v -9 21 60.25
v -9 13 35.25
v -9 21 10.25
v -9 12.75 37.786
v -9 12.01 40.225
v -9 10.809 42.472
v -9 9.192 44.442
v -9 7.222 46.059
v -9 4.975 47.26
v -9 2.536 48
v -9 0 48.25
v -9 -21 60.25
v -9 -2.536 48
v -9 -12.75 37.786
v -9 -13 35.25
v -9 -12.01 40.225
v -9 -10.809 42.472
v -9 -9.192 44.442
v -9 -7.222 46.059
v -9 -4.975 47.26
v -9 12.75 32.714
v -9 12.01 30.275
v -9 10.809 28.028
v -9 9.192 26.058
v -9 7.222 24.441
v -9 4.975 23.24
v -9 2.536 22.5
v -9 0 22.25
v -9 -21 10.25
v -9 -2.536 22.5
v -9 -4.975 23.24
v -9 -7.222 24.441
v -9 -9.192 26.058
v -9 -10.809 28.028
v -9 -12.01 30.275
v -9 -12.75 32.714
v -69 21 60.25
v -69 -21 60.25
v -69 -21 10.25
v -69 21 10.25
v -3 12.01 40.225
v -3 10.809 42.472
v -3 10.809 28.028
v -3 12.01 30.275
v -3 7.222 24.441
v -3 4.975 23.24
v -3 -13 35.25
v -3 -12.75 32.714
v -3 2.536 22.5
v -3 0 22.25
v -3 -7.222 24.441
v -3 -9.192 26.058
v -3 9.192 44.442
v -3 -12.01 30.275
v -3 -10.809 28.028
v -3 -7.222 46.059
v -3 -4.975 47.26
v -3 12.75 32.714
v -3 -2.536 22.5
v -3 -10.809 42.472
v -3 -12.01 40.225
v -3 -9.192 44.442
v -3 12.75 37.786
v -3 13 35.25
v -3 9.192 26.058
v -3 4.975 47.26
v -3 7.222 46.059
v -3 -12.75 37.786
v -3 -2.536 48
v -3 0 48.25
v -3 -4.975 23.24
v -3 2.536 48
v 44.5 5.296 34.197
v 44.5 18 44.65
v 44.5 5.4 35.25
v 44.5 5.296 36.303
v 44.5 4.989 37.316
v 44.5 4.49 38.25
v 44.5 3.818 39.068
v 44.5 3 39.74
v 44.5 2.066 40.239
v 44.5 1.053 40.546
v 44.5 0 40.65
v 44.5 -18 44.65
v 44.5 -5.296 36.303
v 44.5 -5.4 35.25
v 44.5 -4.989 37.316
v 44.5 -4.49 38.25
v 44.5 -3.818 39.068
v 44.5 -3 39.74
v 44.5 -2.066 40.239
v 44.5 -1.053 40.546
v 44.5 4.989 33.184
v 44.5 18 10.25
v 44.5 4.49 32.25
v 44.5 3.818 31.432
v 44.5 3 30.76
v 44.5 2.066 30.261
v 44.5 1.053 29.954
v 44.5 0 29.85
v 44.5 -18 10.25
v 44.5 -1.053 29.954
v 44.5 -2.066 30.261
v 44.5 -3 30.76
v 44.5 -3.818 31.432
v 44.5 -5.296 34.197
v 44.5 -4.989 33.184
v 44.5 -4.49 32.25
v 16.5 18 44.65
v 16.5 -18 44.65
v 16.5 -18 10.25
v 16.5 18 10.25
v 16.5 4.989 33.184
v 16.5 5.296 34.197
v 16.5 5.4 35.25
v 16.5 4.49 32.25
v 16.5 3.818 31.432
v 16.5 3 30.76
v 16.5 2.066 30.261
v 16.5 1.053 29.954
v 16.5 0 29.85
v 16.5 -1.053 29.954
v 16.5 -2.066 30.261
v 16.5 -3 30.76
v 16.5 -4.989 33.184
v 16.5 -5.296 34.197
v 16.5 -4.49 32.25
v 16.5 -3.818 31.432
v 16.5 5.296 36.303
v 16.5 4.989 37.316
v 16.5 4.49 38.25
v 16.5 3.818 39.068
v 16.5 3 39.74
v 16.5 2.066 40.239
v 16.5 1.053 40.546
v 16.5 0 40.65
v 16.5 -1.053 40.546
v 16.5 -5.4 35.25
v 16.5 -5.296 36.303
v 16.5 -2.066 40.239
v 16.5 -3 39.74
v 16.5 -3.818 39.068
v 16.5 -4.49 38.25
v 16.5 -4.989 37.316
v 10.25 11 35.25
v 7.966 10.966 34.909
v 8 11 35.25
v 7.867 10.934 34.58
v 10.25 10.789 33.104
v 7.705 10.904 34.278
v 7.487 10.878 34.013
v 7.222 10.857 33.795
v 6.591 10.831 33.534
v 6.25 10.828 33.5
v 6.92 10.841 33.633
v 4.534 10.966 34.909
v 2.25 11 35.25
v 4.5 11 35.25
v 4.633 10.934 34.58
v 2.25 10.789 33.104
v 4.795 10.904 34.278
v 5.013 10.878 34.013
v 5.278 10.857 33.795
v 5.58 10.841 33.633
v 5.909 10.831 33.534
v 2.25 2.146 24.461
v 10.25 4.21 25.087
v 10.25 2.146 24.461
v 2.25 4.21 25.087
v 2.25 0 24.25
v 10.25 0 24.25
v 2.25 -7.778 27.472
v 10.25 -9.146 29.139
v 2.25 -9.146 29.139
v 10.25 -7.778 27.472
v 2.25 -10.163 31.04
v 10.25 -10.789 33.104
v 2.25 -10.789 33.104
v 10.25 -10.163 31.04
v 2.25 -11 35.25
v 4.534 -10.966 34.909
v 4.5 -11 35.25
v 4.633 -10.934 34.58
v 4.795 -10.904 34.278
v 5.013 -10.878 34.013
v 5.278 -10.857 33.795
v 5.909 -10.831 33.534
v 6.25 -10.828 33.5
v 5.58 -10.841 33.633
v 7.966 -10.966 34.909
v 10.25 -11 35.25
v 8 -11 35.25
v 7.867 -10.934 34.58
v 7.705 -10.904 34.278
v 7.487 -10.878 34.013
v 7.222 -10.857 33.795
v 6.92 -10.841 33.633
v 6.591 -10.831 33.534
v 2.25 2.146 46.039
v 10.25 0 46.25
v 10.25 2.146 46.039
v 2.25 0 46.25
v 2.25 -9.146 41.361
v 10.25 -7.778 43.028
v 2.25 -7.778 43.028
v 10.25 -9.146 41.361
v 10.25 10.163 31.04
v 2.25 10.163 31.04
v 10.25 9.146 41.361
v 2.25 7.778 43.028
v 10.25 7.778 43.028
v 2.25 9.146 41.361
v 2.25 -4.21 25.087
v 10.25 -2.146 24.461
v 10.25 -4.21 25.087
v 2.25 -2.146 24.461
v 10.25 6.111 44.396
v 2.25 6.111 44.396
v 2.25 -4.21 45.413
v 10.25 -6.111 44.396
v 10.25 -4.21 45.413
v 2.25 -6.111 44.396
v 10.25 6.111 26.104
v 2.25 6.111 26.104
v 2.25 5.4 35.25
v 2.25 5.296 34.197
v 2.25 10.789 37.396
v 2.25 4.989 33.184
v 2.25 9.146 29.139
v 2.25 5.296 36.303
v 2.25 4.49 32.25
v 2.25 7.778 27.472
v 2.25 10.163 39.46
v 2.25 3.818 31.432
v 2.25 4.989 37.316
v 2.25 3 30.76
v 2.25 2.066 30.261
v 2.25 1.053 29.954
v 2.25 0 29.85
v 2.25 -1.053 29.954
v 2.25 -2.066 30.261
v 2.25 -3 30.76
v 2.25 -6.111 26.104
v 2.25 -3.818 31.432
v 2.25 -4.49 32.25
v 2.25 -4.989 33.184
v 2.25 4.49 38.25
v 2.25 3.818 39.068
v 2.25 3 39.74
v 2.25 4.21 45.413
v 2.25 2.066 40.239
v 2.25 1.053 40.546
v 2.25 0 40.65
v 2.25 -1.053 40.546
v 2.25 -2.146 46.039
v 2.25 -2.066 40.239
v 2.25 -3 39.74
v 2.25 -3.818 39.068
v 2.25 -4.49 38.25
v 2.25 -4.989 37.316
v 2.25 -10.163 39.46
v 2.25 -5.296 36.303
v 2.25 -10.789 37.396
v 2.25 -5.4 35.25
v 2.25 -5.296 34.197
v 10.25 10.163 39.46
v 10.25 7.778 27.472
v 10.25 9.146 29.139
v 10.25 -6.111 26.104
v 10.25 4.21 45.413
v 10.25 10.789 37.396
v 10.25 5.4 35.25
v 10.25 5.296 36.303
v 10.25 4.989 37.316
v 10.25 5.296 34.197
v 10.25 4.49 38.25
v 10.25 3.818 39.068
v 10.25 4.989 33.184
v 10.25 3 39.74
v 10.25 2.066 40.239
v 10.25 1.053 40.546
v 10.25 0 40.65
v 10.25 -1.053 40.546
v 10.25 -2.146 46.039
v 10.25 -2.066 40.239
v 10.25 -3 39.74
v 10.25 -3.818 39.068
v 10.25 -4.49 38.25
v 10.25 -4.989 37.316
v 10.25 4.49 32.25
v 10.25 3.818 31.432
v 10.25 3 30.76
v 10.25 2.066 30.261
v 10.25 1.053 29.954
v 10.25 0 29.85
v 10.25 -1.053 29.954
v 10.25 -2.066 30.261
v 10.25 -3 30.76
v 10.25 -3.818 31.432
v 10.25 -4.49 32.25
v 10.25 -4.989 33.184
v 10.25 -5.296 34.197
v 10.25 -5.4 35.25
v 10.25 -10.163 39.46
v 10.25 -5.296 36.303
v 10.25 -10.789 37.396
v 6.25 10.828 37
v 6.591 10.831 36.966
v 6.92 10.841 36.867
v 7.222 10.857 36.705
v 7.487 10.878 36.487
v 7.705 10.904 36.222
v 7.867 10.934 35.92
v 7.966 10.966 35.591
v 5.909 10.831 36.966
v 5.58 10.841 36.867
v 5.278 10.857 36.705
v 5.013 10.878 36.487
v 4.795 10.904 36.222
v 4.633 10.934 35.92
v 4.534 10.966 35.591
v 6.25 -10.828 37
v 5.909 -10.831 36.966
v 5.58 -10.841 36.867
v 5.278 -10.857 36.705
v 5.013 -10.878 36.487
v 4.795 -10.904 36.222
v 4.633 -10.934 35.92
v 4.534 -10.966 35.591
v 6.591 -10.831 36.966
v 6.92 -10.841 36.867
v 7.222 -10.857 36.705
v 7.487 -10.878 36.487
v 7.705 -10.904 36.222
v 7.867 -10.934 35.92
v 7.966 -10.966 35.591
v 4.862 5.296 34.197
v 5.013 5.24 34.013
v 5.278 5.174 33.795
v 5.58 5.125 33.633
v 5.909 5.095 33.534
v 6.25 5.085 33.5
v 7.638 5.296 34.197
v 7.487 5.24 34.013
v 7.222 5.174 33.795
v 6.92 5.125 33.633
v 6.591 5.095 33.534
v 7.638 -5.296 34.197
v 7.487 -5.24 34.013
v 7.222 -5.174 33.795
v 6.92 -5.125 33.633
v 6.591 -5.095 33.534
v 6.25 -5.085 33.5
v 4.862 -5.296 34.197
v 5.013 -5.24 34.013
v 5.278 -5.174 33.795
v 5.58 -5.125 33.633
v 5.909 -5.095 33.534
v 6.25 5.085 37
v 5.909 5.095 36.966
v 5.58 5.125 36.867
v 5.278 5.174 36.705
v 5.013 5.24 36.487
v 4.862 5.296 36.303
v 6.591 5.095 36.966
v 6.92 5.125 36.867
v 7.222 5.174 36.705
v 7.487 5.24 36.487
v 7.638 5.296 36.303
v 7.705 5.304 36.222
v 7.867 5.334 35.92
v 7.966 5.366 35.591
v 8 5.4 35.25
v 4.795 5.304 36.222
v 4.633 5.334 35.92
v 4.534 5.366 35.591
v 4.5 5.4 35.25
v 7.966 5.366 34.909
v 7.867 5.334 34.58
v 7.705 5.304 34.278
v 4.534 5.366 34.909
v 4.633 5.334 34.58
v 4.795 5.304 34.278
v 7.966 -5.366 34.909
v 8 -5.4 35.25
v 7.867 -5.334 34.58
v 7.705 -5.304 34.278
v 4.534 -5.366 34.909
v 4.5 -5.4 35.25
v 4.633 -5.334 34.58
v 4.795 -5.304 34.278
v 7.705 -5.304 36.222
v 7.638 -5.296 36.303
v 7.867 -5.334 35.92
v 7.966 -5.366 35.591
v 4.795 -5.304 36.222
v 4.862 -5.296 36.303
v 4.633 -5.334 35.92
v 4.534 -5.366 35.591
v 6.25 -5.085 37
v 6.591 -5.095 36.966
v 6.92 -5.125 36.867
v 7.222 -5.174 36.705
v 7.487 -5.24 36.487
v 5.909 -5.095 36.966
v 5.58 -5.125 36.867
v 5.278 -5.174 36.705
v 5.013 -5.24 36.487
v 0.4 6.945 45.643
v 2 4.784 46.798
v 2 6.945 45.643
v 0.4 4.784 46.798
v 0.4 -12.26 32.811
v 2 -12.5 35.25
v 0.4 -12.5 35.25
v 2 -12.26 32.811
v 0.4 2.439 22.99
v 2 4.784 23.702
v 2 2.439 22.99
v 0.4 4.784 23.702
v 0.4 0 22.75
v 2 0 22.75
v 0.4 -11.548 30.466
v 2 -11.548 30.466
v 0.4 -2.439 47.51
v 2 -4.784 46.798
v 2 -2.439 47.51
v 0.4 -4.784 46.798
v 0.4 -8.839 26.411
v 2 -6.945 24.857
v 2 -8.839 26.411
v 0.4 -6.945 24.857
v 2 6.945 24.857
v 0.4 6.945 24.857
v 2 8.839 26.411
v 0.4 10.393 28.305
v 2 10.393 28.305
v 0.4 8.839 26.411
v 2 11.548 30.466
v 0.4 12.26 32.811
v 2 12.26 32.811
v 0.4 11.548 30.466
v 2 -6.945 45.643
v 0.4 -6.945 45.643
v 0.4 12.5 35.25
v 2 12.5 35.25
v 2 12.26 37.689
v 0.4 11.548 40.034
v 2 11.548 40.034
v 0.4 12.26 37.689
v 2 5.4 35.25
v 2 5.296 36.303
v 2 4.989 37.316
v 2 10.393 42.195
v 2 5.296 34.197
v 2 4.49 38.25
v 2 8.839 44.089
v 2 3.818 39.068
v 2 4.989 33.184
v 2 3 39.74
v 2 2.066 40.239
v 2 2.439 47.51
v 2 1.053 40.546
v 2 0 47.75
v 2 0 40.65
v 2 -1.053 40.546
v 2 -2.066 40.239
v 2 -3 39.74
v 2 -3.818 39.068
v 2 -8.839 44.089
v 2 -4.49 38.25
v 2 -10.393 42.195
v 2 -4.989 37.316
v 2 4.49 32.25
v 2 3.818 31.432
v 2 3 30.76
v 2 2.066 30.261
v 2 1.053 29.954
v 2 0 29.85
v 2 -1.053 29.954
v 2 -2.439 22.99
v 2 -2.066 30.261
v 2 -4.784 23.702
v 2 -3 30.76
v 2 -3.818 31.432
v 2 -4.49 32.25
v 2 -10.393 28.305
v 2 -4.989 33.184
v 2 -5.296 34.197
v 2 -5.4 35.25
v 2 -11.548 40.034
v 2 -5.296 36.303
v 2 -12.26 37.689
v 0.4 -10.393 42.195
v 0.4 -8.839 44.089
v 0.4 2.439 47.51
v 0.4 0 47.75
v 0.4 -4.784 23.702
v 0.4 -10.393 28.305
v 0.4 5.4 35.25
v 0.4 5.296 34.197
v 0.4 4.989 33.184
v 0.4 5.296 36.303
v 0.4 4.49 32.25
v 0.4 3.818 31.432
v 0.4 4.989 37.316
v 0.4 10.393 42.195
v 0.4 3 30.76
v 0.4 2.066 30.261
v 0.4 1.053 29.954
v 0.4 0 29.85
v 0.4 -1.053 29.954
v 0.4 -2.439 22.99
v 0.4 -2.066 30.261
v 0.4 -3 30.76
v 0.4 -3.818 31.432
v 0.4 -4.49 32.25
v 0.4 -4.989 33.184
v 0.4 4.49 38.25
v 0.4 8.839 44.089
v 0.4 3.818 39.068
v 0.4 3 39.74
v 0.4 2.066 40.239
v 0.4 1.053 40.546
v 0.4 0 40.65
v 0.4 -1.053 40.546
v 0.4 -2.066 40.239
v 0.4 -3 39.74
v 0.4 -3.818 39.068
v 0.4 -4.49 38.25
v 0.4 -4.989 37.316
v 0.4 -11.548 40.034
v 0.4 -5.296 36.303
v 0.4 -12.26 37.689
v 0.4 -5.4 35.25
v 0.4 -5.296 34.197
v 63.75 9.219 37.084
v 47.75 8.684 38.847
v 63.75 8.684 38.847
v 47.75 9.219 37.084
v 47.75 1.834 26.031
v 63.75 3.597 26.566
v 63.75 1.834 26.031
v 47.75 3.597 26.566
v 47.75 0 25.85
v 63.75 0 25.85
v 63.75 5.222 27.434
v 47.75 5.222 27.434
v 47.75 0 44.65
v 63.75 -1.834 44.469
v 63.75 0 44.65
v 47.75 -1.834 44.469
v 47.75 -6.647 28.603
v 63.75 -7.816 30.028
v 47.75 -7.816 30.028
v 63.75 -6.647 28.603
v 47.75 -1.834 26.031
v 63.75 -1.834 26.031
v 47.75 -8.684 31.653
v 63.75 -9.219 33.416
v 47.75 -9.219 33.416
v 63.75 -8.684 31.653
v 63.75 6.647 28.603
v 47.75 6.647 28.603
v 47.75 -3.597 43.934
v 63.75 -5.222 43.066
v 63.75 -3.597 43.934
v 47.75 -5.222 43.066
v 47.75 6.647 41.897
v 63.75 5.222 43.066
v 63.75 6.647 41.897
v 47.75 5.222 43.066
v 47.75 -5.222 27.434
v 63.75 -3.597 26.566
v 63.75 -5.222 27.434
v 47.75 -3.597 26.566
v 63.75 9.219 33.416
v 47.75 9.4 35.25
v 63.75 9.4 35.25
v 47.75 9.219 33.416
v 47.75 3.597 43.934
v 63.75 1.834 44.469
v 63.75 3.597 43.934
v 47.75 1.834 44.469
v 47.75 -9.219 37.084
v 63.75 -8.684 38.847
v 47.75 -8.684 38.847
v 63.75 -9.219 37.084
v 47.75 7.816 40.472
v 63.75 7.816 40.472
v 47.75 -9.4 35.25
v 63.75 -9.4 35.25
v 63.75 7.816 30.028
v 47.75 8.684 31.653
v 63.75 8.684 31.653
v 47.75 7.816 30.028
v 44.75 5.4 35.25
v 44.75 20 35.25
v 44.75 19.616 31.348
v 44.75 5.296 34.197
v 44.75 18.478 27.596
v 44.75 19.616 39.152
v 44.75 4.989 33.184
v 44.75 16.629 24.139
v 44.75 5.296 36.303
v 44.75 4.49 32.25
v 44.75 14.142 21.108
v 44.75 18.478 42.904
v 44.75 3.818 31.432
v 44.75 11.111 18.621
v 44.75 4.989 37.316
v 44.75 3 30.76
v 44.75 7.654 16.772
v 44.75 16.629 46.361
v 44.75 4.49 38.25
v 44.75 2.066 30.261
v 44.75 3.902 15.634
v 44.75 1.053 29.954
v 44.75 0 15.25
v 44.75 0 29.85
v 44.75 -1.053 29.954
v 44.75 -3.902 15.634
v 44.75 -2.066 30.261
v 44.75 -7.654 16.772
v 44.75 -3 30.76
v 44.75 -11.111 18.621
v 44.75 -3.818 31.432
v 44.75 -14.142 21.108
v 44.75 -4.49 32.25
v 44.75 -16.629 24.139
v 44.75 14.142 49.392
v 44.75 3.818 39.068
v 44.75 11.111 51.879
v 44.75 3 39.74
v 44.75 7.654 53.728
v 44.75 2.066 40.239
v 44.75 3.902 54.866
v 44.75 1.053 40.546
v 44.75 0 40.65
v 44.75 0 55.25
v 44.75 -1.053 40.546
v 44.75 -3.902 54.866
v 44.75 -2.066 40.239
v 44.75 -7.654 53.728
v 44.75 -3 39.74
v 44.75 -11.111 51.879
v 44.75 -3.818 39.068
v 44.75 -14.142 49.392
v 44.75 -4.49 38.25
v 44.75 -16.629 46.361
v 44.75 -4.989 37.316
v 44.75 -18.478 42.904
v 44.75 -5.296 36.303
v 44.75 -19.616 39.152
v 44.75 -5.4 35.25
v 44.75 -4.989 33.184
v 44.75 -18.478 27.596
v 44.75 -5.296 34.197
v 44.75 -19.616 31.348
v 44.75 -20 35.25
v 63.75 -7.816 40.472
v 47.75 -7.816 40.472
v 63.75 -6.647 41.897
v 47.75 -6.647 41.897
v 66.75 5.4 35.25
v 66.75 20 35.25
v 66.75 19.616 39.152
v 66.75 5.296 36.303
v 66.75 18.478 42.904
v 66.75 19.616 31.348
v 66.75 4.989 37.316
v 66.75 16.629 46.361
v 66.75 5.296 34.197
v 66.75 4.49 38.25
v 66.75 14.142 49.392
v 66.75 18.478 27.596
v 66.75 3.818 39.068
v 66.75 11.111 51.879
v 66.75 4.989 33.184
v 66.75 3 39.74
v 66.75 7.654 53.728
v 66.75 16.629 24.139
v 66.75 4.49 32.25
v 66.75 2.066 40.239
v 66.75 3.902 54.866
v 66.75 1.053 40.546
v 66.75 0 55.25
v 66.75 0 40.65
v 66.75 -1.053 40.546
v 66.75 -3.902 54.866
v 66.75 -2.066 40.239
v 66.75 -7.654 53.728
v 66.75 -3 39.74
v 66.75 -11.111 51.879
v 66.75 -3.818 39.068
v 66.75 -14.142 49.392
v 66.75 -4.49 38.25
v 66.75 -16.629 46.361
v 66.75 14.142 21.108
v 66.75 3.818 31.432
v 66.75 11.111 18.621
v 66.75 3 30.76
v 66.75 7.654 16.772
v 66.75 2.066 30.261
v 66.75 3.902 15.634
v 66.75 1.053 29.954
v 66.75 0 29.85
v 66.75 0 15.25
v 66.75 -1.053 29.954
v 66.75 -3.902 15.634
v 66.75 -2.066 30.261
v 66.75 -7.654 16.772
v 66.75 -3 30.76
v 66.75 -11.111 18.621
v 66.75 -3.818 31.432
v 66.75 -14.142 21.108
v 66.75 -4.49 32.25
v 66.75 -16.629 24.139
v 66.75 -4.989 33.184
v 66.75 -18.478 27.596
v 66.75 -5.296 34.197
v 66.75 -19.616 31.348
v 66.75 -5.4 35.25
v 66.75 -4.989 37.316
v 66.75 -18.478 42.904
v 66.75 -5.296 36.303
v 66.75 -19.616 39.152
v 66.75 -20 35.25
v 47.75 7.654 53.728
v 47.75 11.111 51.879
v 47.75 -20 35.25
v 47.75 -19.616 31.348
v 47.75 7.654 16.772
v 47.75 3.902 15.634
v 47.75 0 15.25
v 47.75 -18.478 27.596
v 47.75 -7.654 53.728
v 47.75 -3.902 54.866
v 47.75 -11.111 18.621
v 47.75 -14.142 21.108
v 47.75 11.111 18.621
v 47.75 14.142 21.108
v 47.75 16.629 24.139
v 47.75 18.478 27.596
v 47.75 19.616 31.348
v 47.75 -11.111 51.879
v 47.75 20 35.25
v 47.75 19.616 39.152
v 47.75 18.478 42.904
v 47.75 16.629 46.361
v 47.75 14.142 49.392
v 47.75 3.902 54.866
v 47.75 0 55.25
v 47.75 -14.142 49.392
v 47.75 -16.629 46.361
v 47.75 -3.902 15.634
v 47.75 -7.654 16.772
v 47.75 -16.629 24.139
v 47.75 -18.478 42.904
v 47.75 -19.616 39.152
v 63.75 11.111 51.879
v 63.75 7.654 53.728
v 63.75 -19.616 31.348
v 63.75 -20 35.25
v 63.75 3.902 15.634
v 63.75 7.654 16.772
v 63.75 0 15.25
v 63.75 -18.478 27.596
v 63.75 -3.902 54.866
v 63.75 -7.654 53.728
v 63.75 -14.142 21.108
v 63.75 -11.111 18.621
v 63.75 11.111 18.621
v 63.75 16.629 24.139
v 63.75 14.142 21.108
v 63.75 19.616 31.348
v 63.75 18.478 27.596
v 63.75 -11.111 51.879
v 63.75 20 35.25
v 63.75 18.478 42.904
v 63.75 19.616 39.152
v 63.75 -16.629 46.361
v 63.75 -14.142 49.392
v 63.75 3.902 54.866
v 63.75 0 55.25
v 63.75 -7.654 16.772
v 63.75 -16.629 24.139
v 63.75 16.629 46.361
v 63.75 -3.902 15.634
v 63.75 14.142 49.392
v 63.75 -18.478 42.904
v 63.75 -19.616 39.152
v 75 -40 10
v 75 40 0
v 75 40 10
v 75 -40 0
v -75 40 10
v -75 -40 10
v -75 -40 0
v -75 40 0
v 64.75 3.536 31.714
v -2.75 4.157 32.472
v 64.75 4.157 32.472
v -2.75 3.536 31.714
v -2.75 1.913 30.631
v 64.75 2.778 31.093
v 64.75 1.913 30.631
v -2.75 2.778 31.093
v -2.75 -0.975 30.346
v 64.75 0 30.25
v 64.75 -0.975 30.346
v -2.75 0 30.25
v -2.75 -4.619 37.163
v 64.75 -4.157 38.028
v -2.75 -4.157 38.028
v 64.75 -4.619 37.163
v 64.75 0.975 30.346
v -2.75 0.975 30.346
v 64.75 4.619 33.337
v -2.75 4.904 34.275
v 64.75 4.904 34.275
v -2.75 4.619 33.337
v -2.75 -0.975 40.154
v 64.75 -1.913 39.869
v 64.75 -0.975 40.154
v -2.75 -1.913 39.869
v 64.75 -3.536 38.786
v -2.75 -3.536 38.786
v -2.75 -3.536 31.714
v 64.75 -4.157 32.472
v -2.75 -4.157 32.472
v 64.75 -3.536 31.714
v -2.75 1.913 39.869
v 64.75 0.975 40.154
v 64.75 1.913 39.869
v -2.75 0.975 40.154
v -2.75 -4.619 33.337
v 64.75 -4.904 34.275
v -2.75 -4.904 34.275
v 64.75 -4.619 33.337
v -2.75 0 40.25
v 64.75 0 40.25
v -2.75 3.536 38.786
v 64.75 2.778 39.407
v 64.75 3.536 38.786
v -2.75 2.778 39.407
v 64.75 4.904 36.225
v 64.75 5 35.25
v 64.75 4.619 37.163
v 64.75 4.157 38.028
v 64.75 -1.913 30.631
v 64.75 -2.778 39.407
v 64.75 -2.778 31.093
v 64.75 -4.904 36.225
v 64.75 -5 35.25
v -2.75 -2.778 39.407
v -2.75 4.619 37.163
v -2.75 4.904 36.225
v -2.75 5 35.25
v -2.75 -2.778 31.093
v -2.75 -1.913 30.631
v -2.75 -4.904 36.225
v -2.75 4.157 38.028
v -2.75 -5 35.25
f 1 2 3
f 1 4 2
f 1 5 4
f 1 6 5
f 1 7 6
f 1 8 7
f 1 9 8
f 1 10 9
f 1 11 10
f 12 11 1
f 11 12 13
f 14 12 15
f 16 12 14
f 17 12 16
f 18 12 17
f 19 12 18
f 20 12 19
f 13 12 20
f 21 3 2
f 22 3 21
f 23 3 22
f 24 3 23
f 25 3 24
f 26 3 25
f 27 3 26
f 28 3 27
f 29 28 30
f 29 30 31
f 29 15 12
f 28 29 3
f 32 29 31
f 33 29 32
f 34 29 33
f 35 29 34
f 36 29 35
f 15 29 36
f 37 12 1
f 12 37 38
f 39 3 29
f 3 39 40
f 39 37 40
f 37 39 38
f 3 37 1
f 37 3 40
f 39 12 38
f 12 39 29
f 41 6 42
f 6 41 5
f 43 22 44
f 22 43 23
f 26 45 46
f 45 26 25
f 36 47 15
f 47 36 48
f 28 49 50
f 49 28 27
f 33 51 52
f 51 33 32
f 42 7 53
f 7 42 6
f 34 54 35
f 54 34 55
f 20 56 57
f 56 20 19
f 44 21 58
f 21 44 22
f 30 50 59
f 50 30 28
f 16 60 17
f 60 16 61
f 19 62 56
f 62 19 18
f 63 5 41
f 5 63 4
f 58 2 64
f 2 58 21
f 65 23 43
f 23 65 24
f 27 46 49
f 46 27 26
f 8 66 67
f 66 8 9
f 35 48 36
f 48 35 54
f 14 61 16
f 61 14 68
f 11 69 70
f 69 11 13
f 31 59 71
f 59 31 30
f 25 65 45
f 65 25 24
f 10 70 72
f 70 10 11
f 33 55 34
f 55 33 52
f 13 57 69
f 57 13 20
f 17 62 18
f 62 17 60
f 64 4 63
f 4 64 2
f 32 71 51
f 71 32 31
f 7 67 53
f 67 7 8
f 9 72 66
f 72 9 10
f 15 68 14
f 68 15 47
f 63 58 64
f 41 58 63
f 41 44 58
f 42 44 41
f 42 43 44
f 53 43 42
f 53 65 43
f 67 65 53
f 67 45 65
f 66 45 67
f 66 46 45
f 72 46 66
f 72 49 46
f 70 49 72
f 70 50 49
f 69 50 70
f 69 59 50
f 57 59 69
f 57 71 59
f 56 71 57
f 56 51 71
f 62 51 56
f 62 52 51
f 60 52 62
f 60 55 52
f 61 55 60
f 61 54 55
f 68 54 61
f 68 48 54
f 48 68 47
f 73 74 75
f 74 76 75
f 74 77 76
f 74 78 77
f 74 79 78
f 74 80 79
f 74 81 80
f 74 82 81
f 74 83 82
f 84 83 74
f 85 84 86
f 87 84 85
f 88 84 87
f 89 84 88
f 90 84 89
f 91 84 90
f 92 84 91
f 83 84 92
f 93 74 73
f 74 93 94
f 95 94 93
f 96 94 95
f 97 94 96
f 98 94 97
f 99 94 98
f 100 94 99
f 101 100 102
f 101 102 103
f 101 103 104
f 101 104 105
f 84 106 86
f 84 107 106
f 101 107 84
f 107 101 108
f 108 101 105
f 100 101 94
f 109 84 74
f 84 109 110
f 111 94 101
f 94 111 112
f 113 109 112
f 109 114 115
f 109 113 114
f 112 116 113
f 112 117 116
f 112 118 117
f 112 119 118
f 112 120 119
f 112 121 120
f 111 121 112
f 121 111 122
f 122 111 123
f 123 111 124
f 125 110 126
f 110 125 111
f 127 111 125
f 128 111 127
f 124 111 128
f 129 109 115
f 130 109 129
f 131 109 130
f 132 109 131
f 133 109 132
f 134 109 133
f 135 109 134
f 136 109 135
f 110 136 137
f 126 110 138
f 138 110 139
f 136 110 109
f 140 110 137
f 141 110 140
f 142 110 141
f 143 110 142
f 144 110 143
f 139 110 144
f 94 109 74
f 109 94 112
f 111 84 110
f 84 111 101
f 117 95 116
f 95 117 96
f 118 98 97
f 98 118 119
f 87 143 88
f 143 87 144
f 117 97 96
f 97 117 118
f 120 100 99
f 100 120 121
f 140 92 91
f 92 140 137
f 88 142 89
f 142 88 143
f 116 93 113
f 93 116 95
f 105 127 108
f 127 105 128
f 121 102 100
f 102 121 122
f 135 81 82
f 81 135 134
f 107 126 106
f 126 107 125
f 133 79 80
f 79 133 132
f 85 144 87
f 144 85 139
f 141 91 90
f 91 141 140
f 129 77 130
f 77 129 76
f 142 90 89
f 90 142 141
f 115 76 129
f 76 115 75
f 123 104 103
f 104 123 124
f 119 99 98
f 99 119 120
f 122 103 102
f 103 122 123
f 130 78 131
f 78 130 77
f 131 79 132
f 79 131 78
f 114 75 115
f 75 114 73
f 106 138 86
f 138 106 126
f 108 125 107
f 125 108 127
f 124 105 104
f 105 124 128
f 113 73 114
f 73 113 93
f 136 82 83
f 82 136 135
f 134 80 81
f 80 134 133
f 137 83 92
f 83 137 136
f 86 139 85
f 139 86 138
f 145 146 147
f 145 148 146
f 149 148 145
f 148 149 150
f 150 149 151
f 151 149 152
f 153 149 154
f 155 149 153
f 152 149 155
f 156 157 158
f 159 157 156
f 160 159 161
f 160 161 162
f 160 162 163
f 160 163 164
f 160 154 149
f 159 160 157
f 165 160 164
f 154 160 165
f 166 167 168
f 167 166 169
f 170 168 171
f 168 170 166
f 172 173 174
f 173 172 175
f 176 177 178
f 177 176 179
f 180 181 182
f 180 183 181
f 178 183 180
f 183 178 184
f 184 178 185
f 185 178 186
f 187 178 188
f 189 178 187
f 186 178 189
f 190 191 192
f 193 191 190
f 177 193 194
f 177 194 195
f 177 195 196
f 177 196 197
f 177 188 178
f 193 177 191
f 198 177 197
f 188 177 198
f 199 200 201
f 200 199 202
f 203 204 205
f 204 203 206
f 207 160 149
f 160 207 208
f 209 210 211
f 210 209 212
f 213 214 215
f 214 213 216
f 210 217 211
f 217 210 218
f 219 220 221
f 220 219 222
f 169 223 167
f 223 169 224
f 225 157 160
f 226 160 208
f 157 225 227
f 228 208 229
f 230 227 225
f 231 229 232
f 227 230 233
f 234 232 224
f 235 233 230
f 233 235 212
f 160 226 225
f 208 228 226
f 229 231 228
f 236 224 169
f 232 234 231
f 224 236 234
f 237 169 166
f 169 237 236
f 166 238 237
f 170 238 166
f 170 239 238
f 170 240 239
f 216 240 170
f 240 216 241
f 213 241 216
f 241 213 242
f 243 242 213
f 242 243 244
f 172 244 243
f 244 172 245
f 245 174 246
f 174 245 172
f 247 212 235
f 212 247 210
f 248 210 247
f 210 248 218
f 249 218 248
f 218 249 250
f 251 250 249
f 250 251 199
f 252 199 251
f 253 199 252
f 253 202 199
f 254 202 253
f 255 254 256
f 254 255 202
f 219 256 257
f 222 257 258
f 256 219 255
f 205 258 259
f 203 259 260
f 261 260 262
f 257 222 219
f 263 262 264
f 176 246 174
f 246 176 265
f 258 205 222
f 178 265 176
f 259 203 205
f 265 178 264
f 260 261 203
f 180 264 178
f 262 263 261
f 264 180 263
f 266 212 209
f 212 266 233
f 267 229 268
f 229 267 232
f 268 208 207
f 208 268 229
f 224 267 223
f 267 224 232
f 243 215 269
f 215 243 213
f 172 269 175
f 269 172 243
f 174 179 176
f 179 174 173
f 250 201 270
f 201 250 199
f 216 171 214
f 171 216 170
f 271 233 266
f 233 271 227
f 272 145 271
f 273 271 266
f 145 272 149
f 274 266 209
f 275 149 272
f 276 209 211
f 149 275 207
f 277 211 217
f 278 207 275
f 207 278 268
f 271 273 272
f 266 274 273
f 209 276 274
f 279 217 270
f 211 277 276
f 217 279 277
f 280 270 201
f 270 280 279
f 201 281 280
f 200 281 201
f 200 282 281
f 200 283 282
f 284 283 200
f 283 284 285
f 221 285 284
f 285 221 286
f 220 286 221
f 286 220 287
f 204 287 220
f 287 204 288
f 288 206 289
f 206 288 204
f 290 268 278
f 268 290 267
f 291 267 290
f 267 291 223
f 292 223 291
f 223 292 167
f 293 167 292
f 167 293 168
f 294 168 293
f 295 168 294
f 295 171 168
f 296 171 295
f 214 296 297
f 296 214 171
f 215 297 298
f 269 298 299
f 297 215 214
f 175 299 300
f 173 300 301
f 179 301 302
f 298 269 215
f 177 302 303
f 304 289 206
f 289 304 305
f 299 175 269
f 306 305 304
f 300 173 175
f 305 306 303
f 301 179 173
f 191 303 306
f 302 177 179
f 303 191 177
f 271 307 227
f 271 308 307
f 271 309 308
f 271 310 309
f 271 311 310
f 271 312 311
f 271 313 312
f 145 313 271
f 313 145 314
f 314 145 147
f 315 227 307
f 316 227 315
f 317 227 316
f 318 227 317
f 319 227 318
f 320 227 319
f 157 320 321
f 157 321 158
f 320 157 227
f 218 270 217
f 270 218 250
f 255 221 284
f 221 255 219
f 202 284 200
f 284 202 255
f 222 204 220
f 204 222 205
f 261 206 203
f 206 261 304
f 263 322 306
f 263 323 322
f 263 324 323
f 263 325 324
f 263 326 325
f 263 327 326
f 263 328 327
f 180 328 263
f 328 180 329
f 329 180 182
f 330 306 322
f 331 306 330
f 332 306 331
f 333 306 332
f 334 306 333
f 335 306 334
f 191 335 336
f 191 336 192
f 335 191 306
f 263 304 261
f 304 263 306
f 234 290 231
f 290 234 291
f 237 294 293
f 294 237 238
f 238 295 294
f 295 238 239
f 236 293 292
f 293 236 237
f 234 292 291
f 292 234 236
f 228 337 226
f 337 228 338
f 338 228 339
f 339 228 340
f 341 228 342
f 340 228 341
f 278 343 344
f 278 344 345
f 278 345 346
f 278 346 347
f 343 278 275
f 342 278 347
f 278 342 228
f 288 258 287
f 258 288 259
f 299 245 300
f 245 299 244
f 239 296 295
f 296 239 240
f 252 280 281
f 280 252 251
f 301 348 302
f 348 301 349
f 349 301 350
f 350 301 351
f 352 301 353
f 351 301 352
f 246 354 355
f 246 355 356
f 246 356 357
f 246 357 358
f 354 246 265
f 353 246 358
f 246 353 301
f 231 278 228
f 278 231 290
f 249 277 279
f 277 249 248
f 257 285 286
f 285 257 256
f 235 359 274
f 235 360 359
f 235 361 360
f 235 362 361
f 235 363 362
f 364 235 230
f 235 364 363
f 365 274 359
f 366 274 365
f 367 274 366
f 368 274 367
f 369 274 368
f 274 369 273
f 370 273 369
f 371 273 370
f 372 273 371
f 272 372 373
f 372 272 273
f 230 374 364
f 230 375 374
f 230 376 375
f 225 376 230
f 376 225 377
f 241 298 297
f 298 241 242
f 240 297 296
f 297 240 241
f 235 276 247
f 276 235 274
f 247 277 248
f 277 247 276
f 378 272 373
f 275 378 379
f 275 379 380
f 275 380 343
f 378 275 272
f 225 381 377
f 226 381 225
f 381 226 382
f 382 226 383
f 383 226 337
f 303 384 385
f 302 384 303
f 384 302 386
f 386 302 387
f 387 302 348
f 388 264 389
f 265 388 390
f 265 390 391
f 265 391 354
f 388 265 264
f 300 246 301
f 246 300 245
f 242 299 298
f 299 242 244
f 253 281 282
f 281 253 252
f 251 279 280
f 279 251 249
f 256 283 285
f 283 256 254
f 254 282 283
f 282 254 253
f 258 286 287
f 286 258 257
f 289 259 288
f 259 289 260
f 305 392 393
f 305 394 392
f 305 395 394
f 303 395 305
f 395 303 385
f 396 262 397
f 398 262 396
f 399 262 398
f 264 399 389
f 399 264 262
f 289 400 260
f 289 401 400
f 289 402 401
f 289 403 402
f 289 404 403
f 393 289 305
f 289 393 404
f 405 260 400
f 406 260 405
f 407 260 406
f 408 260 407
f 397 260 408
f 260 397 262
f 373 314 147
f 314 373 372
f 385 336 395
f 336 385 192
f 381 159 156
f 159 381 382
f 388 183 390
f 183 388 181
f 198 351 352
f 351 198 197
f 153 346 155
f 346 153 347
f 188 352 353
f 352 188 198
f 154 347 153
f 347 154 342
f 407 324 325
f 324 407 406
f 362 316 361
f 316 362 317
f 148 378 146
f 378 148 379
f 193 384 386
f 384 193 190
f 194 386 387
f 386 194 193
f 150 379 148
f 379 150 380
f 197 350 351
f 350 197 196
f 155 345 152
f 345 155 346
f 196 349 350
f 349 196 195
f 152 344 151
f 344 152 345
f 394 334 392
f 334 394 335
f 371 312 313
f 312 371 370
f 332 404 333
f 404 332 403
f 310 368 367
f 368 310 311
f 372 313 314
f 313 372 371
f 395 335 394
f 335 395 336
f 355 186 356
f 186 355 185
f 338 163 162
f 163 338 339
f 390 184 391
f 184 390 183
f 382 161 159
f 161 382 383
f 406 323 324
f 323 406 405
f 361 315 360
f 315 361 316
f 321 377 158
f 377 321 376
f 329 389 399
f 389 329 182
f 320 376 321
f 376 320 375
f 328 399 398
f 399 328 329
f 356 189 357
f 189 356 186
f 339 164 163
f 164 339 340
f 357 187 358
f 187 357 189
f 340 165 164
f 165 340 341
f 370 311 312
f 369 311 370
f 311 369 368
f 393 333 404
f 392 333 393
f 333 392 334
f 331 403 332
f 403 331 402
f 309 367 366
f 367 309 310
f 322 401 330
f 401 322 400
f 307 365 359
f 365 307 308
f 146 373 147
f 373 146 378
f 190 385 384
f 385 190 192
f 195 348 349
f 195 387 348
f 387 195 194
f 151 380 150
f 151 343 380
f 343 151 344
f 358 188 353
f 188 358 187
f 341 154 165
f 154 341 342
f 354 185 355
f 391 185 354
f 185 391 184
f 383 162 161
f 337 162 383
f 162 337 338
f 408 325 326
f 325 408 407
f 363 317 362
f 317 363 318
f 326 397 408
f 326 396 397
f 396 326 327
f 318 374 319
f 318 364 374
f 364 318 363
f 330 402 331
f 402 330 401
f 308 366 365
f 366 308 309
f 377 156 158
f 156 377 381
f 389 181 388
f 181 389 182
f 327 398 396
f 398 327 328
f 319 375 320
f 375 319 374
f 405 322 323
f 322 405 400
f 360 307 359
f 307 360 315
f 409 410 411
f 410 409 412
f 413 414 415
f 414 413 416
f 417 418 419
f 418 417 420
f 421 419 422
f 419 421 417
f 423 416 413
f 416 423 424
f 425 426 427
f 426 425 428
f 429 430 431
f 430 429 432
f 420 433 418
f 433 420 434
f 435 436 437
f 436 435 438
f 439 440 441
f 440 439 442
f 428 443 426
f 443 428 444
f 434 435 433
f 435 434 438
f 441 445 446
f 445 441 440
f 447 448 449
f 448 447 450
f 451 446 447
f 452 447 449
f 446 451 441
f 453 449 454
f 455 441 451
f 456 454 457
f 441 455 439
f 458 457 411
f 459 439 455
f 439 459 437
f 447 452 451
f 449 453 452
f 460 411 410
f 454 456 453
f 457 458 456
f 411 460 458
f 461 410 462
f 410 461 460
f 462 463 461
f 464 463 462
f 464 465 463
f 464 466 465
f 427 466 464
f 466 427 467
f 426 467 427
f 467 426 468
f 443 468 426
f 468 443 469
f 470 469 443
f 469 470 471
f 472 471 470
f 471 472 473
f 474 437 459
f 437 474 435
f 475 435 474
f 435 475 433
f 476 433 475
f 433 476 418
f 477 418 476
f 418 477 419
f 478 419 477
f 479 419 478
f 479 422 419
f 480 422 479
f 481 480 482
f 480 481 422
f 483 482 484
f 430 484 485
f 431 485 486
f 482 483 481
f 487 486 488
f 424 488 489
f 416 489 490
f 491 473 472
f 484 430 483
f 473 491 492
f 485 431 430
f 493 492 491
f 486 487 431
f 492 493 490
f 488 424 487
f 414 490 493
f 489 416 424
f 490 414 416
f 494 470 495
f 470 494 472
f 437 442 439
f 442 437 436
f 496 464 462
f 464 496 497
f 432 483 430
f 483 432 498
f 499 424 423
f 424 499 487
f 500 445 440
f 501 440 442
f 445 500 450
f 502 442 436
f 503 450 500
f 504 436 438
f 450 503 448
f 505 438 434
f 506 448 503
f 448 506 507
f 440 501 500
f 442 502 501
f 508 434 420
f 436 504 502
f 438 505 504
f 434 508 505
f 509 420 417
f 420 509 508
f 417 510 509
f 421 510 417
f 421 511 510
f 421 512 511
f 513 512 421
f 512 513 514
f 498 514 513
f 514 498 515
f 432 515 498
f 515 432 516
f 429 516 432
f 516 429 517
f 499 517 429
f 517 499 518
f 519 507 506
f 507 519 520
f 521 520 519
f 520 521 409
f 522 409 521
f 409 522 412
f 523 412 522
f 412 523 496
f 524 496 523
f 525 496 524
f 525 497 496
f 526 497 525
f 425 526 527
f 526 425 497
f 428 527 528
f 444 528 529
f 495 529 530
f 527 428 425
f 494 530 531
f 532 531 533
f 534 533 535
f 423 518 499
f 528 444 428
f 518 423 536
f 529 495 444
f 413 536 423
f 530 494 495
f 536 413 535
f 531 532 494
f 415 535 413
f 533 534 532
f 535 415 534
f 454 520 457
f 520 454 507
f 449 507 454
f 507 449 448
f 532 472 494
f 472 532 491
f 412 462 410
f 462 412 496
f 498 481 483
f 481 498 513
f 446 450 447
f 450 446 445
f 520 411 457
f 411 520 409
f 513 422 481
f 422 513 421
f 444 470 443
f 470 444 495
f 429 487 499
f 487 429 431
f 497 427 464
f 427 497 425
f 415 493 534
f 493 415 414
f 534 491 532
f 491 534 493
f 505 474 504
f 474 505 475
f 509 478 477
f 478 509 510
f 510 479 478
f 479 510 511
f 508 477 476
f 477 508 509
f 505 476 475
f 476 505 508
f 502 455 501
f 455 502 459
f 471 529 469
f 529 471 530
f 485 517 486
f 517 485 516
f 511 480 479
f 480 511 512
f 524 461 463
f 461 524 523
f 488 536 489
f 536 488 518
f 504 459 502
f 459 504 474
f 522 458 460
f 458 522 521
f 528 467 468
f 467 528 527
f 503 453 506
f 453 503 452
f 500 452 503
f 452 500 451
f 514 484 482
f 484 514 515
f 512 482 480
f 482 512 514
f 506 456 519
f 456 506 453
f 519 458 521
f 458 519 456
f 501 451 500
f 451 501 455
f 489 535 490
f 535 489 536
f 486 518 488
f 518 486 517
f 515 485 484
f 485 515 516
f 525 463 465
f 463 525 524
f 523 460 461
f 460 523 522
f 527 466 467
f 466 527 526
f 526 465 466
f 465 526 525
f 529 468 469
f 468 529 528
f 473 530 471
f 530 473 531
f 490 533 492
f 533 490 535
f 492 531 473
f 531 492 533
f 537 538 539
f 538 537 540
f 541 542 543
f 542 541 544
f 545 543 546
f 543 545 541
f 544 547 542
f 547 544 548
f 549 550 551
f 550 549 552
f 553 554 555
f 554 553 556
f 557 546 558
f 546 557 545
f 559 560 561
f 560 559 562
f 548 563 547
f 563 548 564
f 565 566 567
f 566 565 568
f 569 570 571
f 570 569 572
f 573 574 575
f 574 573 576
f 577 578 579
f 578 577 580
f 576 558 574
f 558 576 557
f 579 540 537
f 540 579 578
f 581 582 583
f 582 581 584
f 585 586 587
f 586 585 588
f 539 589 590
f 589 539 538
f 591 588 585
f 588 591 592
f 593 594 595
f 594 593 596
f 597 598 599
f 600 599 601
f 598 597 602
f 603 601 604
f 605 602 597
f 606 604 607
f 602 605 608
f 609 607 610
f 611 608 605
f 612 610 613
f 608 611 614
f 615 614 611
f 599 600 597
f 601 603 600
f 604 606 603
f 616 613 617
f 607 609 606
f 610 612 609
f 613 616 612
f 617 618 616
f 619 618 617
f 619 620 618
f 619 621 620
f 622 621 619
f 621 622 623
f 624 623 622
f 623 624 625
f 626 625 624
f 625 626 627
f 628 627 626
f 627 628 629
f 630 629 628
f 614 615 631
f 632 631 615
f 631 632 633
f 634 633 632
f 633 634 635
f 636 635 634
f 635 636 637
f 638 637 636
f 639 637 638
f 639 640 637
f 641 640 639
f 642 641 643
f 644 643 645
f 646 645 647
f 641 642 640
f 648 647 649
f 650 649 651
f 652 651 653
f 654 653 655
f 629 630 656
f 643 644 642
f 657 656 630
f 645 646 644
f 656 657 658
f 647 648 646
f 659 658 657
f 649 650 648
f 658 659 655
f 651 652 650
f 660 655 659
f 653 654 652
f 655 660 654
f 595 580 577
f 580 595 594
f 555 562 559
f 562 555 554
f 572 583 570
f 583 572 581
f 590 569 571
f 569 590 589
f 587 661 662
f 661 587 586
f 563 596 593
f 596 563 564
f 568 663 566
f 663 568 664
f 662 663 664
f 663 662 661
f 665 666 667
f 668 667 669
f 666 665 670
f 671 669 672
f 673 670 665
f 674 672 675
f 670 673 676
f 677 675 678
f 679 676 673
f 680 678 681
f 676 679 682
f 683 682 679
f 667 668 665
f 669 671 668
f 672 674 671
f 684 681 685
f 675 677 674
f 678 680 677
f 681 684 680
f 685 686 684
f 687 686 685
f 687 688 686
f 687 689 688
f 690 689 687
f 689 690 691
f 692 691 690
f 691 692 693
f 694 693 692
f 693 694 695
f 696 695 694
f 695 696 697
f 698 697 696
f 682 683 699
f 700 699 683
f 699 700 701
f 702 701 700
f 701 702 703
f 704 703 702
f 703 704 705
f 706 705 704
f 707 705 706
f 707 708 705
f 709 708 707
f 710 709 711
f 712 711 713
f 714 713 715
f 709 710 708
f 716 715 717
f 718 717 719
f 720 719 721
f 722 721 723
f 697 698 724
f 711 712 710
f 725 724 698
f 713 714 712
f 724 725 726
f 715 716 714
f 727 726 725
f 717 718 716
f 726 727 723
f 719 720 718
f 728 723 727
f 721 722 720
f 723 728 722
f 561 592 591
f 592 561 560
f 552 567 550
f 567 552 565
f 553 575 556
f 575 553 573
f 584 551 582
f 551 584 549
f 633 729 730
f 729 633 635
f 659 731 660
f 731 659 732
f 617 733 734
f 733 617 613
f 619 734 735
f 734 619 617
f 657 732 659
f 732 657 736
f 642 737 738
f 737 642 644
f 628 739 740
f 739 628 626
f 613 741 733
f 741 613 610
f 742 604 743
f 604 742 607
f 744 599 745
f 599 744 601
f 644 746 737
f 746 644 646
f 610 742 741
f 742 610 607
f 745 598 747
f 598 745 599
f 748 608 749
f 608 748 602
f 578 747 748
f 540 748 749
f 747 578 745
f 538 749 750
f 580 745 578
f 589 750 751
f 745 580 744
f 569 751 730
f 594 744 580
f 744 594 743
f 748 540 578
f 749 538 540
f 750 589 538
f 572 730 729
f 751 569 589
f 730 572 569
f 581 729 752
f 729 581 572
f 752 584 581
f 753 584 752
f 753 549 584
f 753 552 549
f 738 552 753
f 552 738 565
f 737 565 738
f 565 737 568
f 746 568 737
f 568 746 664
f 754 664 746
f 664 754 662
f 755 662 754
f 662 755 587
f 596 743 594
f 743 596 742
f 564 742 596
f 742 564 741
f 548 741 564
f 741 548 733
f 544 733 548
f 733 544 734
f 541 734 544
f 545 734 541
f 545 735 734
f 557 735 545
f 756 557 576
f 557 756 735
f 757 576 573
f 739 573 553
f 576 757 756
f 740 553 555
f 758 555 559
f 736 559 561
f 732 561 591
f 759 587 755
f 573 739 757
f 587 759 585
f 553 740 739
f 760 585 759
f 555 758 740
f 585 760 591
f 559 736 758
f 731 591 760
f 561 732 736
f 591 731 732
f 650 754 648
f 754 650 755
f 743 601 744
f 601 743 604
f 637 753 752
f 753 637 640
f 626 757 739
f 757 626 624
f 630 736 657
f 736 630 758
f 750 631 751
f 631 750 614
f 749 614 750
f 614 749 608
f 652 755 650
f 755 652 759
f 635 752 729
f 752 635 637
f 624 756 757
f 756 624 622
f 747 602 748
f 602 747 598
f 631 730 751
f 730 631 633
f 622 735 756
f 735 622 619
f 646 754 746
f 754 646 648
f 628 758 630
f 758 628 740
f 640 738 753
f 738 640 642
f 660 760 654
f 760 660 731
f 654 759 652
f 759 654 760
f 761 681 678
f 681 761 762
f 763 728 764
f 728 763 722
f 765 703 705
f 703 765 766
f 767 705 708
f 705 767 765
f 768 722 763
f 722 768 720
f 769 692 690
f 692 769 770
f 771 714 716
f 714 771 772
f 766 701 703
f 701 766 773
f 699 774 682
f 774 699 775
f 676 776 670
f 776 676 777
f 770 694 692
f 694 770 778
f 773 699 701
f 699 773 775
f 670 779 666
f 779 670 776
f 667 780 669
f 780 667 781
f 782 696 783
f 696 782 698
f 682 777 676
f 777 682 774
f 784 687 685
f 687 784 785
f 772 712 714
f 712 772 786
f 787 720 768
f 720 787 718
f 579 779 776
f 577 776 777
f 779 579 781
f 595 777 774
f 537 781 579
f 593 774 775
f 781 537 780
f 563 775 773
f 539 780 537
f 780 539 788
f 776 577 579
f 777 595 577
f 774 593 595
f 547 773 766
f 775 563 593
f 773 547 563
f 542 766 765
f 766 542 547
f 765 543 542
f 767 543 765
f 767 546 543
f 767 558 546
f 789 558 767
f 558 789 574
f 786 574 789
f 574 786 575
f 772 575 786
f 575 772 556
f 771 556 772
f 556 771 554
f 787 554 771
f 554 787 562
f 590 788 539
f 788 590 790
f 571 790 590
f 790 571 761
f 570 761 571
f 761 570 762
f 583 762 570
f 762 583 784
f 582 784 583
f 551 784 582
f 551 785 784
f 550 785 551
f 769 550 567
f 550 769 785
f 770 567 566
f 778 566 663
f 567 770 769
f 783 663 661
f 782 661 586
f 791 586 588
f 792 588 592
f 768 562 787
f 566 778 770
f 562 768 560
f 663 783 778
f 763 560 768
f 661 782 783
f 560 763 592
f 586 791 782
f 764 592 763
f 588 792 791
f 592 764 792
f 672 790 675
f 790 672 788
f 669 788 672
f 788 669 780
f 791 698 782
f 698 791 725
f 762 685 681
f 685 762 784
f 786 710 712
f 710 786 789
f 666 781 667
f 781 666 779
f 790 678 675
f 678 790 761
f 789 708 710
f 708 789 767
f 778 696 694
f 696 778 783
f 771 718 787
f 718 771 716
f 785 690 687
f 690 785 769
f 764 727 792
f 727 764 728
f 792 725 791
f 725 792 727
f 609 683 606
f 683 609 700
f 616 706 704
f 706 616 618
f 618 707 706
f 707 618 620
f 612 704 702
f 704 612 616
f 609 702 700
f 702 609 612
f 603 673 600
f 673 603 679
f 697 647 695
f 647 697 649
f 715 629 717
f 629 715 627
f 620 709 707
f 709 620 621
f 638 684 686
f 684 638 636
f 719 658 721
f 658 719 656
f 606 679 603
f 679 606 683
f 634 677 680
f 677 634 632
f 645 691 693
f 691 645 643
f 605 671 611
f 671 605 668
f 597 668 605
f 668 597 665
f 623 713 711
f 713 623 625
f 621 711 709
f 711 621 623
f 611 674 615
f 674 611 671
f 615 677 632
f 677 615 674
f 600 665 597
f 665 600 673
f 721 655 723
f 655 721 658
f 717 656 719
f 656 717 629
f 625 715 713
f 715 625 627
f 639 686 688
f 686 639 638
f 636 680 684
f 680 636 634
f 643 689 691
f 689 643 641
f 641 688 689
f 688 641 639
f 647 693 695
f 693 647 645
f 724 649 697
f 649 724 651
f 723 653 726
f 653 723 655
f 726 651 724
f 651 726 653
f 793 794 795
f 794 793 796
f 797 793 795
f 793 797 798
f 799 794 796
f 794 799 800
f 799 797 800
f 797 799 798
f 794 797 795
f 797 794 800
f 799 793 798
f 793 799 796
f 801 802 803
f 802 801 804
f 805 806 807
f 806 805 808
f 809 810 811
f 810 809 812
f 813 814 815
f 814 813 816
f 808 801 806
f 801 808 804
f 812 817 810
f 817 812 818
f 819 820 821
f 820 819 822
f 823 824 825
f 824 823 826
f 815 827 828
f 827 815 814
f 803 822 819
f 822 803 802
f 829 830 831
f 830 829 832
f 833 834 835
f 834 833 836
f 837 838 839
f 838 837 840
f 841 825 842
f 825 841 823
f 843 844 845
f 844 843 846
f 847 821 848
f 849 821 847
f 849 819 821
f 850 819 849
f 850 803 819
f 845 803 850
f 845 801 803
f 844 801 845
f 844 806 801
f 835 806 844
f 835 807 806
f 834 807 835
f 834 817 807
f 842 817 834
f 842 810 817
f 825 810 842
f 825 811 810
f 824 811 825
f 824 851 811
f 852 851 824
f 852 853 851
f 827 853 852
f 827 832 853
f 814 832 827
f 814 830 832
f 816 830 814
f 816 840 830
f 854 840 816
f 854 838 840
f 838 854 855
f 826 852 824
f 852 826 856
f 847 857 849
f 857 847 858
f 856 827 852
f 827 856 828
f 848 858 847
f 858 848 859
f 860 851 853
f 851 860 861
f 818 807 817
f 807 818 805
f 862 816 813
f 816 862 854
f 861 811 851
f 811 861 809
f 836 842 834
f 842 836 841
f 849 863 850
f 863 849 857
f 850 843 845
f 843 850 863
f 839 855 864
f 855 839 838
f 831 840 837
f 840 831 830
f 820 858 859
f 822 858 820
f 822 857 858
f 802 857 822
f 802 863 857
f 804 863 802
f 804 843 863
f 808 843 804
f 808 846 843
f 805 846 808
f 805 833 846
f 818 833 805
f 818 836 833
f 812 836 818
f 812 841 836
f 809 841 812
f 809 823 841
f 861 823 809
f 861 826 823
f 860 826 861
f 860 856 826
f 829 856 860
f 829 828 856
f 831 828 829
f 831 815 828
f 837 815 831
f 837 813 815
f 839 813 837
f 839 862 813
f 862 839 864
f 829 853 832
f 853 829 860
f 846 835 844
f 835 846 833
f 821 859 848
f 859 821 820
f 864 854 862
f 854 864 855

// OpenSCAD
$fn = 32;

// ------------------------------------------------------------------------
// Motor drive station: motor 60 x 50 mm, shaft d10, pulley d40
// Every part is its own module, assembly() places every instance.
// ------------------------------------------------------------------------

// --- part 1 ---
module station_bed() {
  difference() {
    translate([-75, -40, 0]) cube([150, 80, 10]);
  }
}

// --- part 2 ---
module drive_motor() {
  union() {
    translate([-30, -21, 0]) cube([60, 42, 50]);
    translate([33, 0, 25]) rotate([0, 90, 0]) cylinder(h = 6, d = 26, center = true);
  }
}

// --- part 3 ---
module pillow_block() {
  difference() {
    translate([-14, -18, 0]) cube([28, 36, 34.4]);
    translate([0, 0, 25]) rotate([0, 90, 0]) cylinder(h = 30, d = 10.8, center = true);
  }
}

// --- part 4 ---
module drive_shaft() {
  translate([0, 0, -33.75]) cylinder(h = 67.5, d = 10);
}

// --- part 5 ---
module shaft_collar() {
  difference() {
    cylinder(h = 8, d = 22);
    translate([0, 0, -1]) cylinder(h = 10, d = 10.8);
    translate([0, 0, 4]) rotate([90, 0, 0]) cylinder(h = 24, d = 3.5, center = true);
  }
}

// --- part 6 ---
module collar_washer() {
  difference() {
      translate([0, 0, 0]) cylinder(h = 1.6, d = 25);
      translate([0, 0, -1]) cylinder(h = 3.6, d = 10.8);
    }
}

// --- part 7 ---
module drive_pulley() {
  difference() {
    union() {
      cylinder(h = 22, d = 18.8);
      cylinder(h = 3, d = 40);
      translate([0, 0, 19]) cylinder(h = 3, d = 40);
    }
    translate([0, 0, -1]) cylinder(h = 24, d = 10.8);
  }
}

// --- assembly ---
module assembly() {
  color([0.80, 0.24, 0.20]) translate([0, 0, 0]) rotate([0, 0, 0]) station_bed();
  color([0.20, 0.45, 0.75]) translate([-39, 0, 10.25]) rotate([0, 0, 0]) drive_motor();
  color([0.25, 0.62, 0.32]) translate([30.5, 0, 10.25]) rotate([0, 0, 0]) pillow_block();
  color([0.92, 0.70, 0.18]) translate([31, 0, 35.25]) rotate([0, 90, 0]) drive_shaft();
  color([0.58, 0.35, 0.70]) translate([2.25, 0, 35.25]) rotate([0, 90, 0]) shaft_collar();
  color([0.16, 0.66, 0.66]) translate([0.4, 0, 35.25]) rotate([0, 90, 0]) collar_washer();
  color([0.85, 0.48, 0.18]) translate([44.75, 0, 35.25]) rotate([0, 90, 0]) drive_pulley();
}

assembly();
